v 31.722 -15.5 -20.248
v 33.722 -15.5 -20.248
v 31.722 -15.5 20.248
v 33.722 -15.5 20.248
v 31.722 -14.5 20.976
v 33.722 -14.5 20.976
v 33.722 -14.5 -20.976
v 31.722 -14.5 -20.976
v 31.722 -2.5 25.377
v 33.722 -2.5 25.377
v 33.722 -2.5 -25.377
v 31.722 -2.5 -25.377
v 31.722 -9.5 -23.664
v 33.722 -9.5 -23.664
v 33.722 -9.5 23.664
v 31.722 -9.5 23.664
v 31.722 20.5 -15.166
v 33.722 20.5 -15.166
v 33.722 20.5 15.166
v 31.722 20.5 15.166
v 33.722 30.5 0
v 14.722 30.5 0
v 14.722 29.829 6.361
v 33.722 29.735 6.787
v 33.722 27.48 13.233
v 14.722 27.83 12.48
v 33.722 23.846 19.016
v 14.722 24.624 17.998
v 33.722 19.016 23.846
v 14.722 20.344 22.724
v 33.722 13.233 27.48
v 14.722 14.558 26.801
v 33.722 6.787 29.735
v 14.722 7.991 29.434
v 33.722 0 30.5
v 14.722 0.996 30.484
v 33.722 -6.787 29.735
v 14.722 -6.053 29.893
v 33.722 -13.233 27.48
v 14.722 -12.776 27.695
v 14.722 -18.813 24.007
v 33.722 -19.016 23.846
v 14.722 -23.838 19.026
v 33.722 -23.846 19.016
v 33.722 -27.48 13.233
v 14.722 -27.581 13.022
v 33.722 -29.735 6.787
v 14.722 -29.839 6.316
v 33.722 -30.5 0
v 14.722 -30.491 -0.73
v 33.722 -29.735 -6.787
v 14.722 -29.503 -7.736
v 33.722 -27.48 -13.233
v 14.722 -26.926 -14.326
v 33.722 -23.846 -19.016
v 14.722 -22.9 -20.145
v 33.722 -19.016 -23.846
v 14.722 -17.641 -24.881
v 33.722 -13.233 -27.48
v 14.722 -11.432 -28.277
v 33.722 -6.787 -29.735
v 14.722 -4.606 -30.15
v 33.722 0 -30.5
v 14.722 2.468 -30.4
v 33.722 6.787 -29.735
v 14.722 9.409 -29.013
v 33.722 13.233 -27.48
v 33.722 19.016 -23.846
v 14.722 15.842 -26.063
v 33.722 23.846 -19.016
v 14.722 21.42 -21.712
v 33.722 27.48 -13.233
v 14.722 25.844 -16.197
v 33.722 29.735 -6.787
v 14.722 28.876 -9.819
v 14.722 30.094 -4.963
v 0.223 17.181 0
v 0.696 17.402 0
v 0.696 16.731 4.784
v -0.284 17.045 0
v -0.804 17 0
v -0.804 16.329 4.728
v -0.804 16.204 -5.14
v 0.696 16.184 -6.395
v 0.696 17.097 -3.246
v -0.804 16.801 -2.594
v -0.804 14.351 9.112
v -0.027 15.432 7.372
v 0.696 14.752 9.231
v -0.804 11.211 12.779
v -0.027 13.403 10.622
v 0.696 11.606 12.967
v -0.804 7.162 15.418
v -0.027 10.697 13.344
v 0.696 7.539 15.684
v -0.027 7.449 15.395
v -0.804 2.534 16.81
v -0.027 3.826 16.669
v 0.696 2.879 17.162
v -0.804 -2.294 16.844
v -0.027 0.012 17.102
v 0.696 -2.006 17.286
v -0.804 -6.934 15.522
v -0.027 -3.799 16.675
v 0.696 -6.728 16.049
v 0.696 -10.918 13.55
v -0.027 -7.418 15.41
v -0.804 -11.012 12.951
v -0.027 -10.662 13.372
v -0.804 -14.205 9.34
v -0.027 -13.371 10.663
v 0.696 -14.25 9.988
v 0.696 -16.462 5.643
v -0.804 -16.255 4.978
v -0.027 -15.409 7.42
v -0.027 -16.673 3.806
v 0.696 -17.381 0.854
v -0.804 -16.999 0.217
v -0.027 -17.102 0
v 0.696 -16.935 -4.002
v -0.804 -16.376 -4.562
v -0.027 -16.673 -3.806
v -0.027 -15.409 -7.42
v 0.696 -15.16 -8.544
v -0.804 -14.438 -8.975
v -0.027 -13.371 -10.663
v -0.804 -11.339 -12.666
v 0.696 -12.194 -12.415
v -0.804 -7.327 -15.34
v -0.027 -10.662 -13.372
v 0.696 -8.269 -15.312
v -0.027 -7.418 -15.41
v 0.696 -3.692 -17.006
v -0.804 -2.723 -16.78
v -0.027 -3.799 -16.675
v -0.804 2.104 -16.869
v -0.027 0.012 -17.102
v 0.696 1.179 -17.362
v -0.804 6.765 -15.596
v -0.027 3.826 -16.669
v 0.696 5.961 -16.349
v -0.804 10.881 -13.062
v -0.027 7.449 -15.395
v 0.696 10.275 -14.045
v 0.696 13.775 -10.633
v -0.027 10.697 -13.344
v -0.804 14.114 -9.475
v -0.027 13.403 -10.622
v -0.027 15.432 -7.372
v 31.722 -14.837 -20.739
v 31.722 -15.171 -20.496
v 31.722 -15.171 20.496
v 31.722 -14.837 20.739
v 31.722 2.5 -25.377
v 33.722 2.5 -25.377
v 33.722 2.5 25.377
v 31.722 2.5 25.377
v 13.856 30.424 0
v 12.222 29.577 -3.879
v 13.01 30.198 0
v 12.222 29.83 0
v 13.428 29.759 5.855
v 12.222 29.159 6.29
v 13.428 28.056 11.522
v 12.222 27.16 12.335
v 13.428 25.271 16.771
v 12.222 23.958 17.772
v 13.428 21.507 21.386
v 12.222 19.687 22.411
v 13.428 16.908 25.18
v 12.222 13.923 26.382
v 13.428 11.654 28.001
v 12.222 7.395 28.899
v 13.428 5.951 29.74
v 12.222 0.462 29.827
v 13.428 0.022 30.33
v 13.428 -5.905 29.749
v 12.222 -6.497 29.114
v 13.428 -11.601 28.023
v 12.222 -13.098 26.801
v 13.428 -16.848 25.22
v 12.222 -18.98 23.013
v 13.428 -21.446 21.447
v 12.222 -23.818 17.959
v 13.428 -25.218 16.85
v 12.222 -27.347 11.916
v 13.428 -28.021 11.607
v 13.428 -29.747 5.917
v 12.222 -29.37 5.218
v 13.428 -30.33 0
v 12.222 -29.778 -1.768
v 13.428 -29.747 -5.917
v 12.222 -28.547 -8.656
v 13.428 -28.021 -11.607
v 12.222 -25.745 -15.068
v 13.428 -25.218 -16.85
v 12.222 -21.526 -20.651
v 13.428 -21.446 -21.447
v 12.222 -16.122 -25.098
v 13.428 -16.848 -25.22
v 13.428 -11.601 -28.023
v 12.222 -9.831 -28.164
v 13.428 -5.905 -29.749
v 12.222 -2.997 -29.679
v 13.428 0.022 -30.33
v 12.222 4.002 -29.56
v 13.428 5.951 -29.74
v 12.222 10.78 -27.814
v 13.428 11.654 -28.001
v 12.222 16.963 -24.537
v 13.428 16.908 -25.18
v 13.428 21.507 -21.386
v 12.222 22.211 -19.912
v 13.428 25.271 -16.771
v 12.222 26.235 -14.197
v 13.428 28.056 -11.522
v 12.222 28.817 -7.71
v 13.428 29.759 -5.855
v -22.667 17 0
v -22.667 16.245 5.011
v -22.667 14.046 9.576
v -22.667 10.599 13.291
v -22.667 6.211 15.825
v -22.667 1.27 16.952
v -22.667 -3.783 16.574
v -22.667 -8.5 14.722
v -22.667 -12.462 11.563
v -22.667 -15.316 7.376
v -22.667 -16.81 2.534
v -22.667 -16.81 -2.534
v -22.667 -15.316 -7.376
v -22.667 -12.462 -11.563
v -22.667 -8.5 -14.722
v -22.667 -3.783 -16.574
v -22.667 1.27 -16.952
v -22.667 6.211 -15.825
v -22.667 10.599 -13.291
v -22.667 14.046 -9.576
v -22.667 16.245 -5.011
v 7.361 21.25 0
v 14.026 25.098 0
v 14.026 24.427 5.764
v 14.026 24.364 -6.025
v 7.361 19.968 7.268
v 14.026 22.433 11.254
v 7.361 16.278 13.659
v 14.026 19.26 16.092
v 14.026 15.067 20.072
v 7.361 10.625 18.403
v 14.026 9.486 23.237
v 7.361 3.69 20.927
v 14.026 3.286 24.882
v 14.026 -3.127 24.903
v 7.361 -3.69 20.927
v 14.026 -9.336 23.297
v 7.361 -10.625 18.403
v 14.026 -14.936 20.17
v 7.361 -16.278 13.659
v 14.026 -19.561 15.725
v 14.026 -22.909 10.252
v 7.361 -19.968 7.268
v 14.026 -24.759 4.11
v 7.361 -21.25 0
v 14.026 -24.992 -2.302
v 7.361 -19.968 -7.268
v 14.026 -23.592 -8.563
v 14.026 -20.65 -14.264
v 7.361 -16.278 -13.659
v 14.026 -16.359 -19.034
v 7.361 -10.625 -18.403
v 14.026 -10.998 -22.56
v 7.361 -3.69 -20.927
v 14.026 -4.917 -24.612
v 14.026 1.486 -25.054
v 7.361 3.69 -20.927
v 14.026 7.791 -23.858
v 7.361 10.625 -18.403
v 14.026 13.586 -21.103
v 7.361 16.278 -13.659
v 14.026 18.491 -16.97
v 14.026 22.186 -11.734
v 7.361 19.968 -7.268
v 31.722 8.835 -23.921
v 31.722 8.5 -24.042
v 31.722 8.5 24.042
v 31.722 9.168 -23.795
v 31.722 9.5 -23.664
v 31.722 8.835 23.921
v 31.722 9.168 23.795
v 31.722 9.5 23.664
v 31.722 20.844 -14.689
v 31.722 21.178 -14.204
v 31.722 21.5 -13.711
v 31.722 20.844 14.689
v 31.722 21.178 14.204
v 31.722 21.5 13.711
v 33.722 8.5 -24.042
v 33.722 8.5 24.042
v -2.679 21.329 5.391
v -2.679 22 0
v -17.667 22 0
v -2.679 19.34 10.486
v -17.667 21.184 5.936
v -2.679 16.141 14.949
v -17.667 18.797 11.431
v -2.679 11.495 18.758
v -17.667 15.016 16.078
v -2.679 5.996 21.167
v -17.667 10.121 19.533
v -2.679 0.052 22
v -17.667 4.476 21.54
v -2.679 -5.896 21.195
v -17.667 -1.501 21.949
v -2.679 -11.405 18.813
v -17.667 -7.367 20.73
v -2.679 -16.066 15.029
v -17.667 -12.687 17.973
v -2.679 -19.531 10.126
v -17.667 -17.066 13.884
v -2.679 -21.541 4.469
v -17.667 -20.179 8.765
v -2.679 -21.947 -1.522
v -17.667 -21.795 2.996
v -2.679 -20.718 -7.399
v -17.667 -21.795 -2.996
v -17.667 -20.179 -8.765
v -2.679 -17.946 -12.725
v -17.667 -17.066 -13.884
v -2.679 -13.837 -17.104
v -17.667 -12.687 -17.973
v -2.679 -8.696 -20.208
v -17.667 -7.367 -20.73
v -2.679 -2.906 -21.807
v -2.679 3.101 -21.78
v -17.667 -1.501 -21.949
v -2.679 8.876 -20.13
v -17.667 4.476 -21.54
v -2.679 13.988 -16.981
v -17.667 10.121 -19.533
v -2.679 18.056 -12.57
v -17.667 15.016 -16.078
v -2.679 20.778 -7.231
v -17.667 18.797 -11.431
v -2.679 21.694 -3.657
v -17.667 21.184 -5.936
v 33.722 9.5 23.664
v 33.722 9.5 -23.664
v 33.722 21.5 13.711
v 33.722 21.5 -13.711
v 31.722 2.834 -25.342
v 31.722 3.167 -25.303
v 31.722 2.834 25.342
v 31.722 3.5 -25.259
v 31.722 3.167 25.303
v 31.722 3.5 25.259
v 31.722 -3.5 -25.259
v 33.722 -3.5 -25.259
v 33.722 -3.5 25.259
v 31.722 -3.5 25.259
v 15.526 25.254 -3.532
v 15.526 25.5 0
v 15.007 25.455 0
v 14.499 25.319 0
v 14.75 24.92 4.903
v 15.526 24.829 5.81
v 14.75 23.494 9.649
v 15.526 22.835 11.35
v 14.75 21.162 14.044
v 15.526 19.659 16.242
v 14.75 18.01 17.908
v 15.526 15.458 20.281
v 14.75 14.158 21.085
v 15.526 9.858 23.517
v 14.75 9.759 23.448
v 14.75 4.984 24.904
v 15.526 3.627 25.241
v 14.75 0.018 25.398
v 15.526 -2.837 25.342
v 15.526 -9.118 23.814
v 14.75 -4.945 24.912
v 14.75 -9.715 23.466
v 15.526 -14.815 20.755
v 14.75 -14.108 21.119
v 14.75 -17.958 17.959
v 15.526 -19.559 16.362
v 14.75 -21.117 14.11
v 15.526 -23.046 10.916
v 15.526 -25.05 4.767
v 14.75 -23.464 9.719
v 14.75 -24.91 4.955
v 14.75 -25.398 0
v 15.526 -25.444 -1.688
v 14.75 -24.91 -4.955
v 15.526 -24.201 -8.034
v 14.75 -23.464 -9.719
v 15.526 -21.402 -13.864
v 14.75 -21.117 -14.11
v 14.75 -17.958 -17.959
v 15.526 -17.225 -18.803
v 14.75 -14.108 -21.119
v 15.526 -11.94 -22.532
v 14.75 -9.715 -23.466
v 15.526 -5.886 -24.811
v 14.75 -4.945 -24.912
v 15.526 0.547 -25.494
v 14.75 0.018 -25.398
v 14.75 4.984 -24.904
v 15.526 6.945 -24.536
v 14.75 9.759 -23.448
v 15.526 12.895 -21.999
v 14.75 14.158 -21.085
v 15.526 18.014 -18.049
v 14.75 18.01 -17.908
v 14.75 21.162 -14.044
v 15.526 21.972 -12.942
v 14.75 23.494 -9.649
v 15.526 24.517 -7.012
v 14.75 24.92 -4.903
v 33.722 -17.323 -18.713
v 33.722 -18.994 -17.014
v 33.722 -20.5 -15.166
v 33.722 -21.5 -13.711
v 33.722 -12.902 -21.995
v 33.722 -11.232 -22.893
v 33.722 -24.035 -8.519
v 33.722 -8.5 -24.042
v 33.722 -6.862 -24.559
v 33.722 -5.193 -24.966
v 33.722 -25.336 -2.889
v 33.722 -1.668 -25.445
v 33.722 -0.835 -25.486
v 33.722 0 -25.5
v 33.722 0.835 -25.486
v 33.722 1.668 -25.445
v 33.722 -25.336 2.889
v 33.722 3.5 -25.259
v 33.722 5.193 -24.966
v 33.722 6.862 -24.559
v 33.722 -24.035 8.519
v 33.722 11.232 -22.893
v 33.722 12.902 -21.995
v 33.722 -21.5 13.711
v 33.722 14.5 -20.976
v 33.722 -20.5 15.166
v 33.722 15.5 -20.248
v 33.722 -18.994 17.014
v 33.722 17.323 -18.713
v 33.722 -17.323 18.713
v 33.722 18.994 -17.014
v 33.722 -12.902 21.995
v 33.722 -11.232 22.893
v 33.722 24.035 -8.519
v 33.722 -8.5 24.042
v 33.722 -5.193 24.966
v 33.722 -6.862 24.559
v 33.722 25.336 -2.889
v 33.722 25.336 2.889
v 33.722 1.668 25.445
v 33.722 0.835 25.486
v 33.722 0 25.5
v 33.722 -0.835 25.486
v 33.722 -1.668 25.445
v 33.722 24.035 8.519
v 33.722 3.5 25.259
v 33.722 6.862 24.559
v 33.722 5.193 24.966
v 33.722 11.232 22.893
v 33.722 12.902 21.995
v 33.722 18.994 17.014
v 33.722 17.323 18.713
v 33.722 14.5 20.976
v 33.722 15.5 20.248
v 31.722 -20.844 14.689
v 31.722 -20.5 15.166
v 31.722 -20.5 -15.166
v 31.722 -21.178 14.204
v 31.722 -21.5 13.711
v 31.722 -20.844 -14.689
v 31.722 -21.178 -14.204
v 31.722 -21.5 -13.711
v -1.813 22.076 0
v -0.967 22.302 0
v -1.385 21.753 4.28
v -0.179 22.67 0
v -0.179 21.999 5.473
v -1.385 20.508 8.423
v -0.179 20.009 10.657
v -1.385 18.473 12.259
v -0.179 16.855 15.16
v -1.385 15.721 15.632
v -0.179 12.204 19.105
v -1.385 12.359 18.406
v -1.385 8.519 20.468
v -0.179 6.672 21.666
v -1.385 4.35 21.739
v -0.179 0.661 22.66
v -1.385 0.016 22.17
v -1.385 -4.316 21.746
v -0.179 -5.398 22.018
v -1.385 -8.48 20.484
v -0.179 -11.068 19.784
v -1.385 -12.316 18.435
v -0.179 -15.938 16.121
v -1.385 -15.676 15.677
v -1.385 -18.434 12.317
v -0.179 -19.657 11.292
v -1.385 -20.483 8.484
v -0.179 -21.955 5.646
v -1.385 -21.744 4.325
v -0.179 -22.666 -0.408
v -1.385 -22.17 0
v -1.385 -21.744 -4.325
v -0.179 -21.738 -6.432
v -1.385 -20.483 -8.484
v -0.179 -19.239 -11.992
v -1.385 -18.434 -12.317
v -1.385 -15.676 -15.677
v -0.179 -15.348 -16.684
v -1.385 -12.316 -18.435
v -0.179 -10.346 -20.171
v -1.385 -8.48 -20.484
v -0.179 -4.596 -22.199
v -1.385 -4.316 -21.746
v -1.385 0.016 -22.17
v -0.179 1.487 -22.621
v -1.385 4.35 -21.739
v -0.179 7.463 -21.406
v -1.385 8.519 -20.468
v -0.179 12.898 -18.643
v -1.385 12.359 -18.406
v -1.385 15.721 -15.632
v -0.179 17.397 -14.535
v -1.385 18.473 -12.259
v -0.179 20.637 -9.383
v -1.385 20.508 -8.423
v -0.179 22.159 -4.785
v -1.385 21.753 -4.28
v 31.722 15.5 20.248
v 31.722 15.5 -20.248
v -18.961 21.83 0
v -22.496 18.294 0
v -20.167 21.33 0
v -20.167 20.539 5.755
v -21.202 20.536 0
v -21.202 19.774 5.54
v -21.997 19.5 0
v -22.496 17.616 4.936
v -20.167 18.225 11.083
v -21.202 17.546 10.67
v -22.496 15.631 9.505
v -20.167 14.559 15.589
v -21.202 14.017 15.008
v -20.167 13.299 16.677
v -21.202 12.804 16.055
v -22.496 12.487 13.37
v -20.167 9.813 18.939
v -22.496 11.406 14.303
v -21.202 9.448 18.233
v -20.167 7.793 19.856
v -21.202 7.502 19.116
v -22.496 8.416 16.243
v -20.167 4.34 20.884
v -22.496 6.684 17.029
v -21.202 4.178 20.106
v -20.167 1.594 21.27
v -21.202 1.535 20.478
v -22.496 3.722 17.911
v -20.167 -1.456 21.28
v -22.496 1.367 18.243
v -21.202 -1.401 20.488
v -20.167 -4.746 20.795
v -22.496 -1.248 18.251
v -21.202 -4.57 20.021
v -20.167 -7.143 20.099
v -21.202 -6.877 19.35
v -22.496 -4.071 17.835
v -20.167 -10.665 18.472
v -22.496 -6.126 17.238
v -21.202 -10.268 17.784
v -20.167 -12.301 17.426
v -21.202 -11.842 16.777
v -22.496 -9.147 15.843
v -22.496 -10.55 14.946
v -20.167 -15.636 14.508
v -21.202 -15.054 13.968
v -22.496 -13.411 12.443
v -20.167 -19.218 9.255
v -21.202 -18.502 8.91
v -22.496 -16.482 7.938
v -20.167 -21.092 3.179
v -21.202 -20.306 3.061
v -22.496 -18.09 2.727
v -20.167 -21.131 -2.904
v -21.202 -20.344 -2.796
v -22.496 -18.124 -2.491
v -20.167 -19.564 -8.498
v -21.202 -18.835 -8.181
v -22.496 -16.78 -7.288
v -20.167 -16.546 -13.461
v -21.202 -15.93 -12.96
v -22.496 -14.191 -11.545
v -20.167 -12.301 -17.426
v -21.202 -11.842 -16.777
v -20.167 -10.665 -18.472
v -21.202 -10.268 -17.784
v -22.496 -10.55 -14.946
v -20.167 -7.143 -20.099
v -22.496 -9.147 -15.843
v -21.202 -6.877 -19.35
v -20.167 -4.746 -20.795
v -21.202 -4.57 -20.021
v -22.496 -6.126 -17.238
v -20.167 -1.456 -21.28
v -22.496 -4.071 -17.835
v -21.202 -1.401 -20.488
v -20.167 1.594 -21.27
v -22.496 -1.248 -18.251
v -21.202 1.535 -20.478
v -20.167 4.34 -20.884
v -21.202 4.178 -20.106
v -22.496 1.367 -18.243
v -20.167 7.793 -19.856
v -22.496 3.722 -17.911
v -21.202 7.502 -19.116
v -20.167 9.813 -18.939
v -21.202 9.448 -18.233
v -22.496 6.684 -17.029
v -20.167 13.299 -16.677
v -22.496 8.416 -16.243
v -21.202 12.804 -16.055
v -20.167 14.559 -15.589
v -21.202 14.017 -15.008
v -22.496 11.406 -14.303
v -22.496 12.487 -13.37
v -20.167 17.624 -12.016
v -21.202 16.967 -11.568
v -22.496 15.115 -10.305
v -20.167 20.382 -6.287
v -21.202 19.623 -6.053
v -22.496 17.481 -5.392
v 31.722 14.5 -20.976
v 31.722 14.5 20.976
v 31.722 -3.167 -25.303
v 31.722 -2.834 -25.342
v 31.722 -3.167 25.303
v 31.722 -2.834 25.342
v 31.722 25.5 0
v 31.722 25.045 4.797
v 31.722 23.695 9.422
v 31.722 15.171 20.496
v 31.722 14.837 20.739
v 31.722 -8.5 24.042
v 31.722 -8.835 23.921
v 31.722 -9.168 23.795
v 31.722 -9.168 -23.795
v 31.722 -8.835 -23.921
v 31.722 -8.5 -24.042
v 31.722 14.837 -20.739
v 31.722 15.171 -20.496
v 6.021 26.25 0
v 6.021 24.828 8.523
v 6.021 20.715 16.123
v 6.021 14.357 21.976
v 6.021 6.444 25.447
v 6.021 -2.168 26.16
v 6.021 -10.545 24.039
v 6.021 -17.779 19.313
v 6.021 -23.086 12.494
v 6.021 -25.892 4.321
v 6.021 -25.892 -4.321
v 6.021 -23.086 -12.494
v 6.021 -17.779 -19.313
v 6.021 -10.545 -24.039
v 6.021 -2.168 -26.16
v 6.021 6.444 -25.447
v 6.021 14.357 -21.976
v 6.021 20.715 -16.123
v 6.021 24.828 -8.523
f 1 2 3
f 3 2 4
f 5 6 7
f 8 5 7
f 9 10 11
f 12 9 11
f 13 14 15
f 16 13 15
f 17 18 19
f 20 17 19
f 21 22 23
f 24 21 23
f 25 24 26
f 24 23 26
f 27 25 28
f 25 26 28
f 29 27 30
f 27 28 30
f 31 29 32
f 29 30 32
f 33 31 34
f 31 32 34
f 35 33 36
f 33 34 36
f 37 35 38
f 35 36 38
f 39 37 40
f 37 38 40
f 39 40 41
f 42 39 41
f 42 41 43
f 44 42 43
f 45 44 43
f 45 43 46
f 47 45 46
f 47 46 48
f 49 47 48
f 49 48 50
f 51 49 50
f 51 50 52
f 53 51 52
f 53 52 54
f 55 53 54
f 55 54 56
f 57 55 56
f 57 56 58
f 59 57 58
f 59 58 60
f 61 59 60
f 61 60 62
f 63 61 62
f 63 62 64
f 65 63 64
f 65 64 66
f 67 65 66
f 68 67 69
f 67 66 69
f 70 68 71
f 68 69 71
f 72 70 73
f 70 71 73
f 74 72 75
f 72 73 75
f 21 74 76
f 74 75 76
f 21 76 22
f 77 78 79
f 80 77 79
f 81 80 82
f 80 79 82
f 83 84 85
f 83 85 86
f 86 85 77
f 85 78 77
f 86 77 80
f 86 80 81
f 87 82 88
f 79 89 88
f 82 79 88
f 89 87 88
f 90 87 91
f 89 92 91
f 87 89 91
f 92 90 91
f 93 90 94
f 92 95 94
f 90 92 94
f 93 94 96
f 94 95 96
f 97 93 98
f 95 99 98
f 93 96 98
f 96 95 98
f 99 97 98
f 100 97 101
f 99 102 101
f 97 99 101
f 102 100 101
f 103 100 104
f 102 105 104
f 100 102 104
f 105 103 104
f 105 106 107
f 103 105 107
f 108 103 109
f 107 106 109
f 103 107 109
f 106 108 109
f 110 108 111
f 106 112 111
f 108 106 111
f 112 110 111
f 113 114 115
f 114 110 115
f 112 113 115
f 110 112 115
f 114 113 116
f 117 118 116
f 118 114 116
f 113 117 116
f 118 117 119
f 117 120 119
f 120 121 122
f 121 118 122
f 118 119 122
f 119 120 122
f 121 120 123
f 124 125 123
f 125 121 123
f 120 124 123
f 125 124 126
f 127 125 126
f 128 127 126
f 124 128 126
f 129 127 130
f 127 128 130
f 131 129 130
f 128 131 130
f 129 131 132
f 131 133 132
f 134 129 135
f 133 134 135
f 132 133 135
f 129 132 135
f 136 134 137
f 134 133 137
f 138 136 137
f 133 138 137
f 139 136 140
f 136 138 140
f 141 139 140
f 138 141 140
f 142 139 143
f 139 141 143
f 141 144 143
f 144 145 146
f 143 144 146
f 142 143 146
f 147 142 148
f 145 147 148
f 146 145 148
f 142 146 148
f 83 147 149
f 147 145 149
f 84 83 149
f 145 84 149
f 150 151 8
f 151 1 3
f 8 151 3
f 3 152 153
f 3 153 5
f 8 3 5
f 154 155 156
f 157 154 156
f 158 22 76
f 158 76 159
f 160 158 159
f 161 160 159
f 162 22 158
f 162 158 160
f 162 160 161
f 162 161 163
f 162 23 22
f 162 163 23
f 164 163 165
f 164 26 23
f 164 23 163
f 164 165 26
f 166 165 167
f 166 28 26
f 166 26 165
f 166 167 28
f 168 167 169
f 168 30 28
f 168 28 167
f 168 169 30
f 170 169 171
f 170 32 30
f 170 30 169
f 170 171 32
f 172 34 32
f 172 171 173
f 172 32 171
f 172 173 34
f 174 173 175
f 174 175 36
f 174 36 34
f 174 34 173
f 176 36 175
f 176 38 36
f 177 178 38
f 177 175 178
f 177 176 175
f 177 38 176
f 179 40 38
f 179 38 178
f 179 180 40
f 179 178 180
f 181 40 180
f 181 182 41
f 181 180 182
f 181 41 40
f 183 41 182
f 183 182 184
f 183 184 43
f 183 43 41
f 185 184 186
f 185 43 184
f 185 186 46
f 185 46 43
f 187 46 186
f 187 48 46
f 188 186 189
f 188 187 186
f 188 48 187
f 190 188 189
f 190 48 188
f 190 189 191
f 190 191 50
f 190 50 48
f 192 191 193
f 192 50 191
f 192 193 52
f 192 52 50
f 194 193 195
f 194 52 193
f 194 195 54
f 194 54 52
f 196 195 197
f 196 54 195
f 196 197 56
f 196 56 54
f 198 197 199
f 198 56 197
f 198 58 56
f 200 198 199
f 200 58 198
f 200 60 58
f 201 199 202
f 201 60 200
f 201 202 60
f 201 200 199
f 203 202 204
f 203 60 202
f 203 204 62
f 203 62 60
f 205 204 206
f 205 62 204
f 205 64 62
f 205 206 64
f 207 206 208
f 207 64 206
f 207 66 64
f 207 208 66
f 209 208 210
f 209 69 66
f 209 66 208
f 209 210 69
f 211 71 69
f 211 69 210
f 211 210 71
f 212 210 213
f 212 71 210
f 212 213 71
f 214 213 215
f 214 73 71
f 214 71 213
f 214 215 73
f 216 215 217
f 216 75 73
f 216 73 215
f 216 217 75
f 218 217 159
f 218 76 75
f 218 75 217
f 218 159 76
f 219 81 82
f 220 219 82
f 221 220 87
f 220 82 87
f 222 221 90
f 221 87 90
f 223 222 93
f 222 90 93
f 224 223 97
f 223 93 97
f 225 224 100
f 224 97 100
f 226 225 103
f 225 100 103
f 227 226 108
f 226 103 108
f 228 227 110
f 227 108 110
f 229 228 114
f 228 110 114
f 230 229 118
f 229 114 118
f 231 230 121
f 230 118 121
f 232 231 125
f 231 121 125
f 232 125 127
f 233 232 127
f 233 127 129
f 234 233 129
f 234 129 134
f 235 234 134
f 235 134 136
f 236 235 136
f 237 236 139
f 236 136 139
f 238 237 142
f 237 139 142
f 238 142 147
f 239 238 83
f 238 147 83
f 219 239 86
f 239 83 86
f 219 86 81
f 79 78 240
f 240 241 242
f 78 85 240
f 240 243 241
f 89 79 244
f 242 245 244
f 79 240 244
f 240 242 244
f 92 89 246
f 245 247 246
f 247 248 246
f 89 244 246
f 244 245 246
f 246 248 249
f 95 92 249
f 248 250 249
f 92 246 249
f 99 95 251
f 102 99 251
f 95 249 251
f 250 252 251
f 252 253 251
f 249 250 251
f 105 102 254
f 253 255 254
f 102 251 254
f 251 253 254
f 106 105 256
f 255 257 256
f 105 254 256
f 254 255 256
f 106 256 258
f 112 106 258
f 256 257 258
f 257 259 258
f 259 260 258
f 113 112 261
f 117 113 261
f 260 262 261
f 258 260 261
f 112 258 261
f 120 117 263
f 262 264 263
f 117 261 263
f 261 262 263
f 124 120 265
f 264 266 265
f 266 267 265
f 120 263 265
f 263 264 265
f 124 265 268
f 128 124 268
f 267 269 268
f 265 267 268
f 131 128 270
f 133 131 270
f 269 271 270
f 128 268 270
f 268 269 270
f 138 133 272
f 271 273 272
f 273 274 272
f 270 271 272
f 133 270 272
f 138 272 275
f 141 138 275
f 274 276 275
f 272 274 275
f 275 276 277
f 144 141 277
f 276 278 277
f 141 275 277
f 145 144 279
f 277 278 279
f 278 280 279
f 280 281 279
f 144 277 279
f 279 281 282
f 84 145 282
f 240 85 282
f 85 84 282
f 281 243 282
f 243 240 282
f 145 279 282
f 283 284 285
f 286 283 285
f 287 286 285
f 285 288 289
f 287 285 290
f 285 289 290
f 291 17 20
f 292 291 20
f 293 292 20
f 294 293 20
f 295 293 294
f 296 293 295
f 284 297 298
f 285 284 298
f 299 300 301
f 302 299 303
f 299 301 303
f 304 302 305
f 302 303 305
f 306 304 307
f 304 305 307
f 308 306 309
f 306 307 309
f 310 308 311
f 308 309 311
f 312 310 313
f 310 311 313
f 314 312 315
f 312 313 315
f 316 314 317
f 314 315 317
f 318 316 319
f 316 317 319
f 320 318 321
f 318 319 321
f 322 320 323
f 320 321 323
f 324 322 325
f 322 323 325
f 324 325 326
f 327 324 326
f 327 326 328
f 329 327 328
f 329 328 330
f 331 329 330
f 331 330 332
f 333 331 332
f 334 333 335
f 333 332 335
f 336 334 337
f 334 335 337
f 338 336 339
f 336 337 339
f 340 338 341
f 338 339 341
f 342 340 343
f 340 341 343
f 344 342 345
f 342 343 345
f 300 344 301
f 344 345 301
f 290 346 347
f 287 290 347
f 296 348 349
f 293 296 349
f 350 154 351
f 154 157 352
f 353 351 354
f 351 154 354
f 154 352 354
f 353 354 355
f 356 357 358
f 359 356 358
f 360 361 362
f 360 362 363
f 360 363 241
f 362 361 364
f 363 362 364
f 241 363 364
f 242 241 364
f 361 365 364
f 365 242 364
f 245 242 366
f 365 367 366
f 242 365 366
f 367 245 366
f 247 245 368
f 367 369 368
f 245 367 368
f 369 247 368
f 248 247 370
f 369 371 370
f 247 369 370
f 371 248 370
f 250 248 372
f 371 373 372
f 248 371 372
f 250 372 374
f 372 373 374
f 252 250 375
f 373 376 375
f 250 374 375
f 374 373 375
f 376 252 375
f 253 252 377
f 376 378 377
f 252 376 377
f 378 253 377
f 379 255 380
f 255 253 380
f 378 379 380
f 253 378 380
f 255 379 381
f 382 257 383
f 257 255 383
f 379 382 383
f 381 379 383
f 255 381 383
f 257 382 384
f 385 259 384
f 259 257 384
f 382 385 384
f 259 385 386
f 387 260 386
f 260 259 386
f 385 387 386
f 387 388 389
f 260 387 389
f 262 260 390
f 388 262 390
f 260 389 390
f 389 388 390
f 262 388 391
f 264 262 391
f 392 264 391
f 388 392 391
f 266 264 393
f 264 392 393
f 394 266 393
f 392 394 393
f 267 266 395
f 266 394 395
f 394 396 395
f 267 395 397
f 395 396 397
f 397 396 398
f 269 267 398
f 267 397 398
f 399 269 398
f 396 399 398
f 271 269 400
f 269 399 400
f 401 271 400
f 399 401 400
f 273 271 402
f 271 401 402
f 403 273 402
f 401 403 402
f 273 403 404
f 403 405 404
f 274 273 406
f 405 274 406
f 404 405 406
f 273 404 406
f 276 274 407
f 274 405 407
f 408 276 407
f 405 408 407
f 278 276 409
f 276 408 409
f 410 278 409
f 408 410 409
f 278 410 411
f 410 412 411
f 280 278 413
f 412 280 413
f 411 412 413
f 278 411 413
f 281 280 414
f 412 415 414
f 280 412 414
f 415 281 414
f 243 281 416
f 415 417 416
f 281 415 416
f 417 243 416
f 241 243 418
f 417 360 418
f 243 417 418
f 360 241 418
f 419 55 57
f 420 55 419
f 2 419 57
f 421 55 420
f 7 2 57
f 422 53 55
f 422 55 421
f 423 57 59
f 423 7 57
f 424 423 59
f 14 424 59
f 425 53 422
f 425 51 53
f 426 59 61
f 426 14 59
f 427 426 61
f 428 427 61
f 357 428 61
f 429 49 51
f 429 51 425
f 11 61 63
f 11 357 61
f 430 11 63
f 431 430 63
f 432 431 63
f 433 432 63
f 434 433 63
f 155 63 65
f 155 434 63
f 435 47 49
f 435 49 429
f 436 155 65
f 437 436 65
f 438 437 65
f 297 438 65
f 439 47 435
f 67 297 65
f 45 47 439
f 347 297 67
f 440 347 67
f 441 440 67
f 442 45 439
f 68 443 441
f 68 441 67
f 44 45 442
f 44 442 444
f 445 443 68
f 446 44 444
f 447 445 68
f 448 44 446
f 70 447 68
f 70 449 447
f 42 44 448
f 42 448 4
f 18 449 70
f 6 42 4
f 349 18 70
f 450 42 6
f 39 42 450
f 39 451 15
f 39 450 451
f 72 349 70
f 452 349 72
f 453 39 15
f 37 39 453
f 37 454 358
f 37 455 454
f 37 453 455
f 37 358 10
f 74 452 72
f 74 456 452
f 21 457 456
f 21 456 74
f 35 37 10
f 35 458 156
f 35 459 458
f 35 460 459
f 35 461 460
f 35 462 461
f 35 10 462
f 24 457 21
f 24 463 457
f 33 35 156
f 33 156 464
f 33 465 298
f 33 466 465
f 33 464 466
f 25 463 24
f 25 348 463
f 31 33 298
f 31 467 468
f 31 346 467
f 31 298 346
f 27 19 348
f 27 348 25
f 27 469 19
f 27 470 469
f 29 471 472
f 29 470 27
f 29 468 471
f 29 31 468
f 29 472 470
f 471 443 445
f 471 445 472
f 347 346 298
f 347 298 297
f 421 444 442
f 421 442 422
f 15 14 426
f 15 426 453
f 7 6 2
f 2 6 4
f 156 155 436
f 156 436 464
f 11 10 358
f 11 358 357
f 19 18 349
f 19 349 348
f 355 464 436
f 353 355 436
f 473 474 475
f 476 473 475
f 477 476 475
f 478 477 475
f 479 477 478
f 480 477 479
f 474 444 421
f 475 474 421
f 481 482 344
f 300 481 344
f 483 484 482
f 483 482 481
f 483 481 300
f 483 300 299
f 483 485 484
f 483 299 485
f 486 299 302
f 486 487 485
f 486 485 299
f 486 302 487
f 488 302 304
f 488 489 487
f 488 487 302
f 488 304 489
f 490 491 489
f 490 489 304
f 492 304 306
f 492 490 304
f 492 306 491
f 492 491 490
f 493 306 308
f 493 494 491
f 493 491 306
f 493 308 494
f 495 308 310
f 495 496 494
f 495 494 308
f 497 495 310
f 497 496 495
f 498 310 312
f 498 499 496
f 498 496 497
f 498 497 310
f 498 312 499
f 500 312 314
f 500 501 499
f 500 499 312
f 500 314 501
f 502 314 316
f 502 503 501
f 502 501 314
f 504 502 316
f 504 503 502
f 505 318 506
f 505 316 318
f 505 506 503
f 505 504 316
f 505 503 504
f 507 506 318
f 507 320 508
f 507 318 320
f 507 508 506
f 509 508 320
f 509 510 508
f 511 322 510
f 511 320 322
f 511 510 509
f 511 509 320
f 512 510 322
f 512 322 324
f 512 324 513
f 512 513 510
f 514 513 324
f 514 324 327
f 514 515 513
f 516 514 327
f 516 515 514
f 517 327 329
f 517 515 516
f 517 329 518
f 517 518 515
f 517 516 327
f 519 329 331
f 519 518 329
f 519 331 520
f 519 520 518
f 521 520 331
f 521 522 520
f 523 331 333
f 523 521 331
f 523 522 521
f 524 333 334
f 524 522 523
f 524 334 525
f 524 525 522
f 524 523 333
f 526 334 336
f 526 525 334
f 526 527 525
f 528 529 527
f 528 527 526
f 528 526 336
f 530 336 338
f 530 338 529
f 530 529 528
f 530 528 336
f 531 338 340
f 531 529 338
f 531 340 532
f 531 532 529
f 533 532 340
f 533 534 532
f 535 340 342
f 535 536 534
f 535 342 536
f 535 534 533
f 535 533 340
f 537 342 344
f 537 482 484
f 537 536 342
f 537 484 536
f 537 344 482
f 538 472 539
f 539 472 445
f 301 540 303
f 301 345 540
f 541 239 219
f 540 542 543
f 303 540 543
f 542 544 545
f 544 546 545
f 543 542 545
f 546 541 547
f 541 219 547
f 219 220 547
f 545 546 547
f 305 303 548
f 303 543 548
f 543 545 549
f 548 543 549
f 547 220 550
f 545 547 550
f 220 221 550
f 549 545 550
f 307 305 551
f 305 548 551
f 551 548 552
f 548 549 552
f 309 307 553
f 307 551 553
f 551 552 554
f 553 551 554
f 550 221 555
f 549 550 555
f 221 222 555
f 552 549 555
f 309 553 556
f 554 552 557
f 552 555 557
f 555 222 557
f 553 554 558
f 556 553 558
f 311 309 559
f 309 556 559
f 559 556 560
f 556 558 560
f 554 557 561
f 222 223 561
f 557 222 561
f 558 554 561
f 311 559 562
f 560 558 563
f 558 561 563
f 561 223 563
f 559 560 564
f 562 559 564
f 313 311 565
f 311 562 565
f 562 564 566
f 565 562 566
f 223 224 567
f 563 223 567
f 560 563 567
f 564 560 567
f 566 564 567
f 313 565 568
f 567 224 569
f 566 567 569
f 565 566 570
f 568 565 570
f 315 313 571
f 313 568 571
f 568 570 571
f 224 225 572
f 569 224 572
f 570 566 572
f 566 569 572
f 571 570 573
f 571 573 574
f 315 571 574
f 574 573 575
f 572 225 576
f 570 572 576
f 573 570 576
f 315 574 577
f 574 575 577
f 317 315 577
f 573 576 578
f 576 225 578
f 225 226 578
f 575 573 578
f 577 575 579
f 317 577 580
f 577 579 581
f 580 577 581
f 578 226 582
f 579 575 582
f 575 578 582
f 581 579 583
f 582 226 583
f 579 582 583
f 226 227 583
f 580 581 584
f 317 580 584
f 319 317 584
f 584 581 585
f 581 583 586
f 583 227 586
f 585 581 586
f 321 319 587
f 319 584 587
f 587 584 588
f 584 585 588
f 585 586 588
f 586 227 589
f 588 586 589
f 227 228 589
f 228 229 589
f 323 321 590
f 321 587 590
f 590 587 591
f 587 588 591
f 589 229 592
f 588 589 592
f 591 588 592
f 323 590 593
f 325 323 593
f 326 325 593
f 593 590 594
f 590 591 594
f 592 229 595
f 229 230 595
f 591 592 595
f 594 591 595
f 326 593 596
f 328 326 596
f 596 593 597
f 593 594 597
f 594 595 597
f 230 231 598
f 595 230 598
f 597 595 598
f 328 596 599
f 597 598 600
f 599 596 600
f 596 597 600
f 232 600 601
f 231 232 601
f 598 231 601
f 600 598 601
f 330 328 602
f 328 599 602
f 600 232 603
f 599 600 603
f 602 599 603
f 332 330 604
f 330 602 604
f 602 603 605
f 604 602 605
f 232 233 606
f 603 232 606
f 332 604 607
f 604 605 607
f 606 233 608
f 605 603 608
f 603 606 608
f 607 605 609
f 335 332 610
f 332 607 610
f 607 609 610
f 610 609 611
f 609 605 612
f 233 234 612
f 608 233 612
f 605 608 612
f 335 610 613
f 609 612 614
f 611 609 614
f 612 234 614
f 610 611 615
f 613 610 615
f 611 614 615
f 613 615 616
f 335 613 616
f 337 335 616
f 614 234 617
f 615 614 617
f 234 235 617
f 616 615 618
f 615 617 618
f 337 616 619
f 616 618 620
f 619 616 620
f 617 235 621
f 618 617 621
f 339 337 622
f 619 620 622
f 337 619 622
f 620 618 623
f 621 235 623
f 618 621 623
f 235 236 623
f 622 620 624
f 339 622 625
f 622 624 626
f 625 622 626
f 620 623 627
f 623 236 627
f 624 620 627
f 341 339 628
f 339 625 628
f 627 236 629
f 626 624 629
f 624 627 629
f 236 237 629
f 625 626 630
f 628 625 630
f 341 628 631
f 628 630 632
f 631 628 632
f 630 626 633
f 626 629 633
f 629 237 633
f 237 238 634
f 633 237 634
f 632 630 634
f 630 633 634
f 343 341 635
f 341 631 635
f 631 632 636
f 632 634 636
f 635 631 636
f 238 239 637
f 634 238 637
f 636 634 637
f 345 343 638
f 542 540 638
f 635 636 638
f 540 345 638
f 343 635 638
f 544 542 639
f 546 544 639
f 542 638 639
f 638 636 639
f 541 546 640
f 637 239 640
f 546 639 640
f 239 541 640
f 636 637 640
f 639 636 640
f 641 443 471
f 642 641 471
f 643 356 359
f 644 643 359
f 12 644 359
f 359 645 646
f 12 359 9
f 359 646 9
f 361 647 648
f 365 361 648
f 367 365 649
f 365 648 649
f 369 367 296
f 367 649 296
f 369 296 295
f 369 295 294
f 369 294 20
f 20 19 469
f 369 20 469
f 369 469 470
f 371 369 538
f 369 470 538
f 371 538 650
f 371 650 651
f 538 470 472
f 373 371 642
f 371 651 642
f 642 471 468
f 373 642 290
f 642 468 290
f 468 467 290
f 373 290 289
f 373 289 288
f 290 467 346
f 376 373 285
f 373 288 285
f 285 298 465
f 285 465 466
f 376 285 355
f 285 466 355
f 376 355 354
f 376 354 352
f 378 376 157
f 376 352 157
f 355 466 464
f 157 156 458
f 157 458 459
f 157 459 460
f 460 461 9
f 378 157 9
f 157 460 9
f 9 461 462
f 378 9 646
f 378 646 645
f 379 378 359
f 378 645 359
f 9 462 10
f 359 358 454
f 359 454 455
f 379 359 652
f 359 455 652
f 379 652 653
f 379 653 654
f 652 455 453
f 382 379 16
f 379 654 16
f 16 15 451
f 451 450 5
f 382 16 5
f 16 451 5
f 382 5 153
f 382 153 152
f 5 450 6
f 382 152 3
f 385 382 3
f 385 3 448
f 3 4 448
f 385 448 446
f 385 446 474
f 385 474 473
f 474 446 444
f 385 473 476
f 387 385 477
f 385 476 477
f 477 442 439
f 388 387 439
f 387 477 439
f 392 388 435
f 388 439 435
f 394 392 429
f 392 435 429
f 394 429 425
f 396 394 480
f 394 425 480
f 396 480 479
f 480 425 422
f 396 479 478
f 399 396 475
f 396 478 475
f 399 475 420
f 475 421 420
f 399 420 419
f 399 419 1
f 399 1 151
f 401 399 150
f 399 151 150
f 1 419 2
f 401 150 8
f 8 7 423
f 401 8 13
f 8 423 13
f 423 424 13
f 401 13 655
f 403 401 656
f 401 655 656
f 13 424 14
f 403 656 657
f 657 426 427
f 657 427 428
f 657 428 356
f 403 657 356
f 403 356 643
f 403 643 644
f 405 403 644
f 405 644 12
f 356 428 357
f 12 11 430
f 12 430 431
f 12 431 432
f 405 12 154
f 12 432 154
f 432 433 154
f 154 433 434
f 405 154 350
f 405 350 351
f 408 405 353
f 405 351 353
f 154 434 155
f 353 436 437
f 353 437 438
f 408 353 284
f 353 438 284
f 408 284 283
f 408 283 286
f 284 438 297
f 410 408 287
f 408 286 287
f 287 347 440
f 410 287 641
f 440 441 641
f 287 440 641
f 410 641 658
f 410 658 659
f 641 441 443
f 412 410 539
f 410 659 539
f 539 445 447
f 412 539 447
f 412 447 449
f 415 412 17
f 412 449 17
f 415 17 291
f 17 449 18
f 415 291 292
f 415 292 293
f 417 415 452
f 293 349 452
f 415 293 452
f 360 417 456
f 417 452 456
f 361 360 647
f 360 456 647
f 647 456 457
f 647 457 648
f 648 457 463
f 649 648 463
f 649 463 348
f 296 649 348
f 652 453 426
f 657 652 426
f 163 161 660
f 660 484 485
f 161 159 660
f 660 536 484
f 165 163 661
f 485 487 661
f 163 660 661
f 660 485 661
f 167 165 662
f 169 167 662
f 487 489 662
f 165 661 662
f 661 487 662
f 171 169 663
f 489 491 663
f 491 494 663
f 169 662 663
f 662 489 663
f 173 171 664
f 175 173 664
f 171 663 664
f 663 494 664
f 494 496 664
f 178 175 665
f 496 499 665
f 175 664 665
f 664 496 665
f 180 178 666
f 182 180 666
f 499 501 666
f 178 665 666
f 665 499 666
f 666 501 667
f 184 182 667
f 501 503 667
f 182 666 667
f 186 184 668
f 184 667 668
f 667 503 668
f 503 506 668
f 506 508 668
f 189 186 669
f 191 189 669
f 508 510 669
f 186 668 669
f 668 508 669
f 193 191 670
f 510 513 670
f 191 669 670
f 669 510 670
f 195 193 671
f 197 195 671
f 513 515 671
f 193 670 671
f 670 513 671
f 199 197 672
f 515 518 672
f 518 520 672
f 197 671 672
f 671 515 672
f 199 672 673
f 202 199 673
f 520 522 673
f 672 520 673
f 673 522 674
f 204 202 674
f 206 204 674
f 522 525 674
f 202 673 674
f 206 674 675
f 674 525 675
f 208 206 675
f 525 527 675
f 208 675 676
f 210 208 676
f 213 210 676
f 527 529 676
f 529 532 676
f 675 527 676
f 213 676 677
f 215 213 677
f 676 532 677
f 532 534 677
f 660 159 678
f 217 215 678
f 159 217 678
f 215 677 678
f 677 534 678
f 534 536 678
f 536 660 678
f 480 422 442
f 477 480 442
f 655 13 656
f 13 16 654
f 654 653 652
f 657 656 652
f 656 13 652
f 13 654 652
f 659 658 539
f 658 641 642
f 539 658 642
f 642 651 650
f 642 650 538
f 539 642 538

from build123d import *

# Parameters (mm, degrees)
F2_R     = 30.5
F3_DEPTH = 2
F5_DEPTH = 2
F6_R     = 4.99999
F7_R     = 3


# Not quite as in the source:
# - a fillet or chamfer is up to 0.001 mm smaller than in the source, because OpenCascade refuses the exact size
# - a feature names something its author has since deleted; it is built from what else it names


with BuildPart() as f1:
    # F0 (on Top) → F1 (revolve)
    with BuildSketch(Plane.XY):
        Polygon((-22.6666666667, 22), (-22.6666666667, 17), (0, 17), (14.7224318643, 25.5), (31.7224318643, 25.5), (31.7224318643, 30.5), (13.3826859022, 30.5), (-1.3397459622, 22), align=None)
    revolve(axis=Axis((-8.7595172226, 0, 0), (1, 0, 0)))

    # F2 (on face) → F3 (join)
    with BuildSketch(Plane.YZ.offset(31.7224318643)):
        Circle(F2_R)
    extrude(amount=F3_DEPTH)

    # F4 (on face) → F5 (cut, through all)
    with BuildSketch(Plane.YZ.offset(33.7224318643)):
        with BuildLine():
            ThreePointArc((20.5, 15.1657508881), (18.1785168447, 17.8827158264), (15.5, 20.2484567313))
            Line((15.5, 20.2484567313), (15.5, -20.2484567313))
            ThreePointArc((15.5, -20.2484567313), (18.1785168447, -17.8827158264), (20.5, -15.1657508881))
            Line((20.5, -15.1657508881), (20.5, 15.1657508881))
        make_face()
        with BuildLine():
            ThreePointArc((14.5, 20.9761769634), (12.0750373532, 22.4598190758), (9.5, 23.6643191324))
            Line((9.5, 23.6643191324), (9.5, -23.6643191324))
            ThreePointArc((9.5, -23.6643191324), (12.0750373532, -22.4598190758), (14.5, -20.9761769634))
            Line((14.5, -20.9761769634), (14.5, 20.9761769634))
        make_face()
        with BuildLine():
            ThreePointArc((8.5, 24.0416305603), (6.0307786652, 24.7765959868), (3.5, 25.2586618806))
            Line((3.5, 25.2586618806), (3.5, -25.2586618806))
            ThreePointArc((3.5, -25.2586618806), (6.0307786652, -24.7765959868), (8.5, -24.0416305603))
            Line((8.5, -24.0416305603), (8.5, 24.0416305603))
        make_face()
        with BuildLine():
            ThreePointArc((2.5, 25.3771550809), (1.2515081776, 25.4692702542), (0, 25.5))
            ThreePointArc((0, 25.5), (-1.2515081776, 25.4692702542), (-2.5, 25.3771550809))
            Line((-2.5, 25.3771550809), (-2.5, -25.3771550809))
            ThreePointArc((-2.5, -25.3771550809), (-1.2515081776, -25.4692702542), (0, -25.5))
            ThreePointArc((0, -25.5), (1.2515081776, -25.4692702542), (2.5, -25.3771550809))
            Line((2.5, -25.3771550809), (2.5, 25.3771550809))
        make_face()
        with BuildLine():
            Line((-3.5, -25.2586618806), (-3.5, 25.2586618806))
            ThreePointArc((-3.5, 25.2586618806), (-6.0307786652, 24.7765959868), (-8.5, 24.0416305603))
            Line((-8.5, 24.0416305603), (-8.5, -24.0416305603))
            ThreePointArc((-8.5, -24.0416305603), (-6.0307786652, -24.7765959868), (-3.5, -25.2586618806))
        make_face()
        with BuildLine():
            Line((-9.5, -23.6643191324), (-9.5, 23.6643191324))
            ThreePointArc((-9.5, 23.6643191324), (-12.0750373532, 22.4598190758), (-14.5, 20.9761769634))
            Line((-14.5, 20.9761769634), (-14.5, -20.9761769634))
            ThreePointArc((-14.5, -20.9761769634), (-12.0750373532, -22.4598190758), (-9.5, -23.6643191324))
        make_face()
        with BuildLine():
            Line((-15.5, -20.2484567313), (-15.5, 20.2484567313))
            ThreePointArc((-15.5, 20.2484567313), (-18.1785168447, 17.8827158264), (-20.5, 15.1657508881))
            Line((-20.5, 15.1657508881), (-20.5, -15.1657508881))
            ThreePointArc((-20.5, -15.1657508881), (-18.1785168447, -17.8827158264), (-15.5, -20.2484567313))
        make_face()
        with BuildLine():
            Line((-21.5, -13.7113092008), (-21.5, 13.7113092008))
            ThreePointArc((-21.5, 13.7113092008), (-25.5, 0), (-21.5, -13.7113092008))
        make_face()
        with BuildLine():
            ThreePointArc((25.5, 0), (24.4795833298, 7.1414284285), (21.5, 13.7113092008))
            Line((21.5, 13.7113092008), (21.5, -13.7113092008))
            ThreePointArc((21.5, -13.7113092008), (24.4795833298, -7.1414284285), (25.5, 0))
        make_face()
    extrude(amount=-F5_DEPTH, mode=Mode.SUBTRACT)

    # F6 (radius 5 in the source; OpenCascade refuses exactly that, so slightly less here)
    f6_edges = [f1.edges().sort_by_distance(p)[0] for p in [
        (-22.666667, -22, 0),
        (-1.339746, -22, 0),
        (13.382686, -30.5, 0),
    ]]
    fillet(f6_edges, radius=F6_R)

    # F7
    f7_edges = [f1.edges().sort_by_distance(p)[0] for p in [
        (14.722432, -25.5, 0),
        (0, -17, 0),
    ]]
    fillet(f7_edges, radius=F7_R)


solid = f1.part
